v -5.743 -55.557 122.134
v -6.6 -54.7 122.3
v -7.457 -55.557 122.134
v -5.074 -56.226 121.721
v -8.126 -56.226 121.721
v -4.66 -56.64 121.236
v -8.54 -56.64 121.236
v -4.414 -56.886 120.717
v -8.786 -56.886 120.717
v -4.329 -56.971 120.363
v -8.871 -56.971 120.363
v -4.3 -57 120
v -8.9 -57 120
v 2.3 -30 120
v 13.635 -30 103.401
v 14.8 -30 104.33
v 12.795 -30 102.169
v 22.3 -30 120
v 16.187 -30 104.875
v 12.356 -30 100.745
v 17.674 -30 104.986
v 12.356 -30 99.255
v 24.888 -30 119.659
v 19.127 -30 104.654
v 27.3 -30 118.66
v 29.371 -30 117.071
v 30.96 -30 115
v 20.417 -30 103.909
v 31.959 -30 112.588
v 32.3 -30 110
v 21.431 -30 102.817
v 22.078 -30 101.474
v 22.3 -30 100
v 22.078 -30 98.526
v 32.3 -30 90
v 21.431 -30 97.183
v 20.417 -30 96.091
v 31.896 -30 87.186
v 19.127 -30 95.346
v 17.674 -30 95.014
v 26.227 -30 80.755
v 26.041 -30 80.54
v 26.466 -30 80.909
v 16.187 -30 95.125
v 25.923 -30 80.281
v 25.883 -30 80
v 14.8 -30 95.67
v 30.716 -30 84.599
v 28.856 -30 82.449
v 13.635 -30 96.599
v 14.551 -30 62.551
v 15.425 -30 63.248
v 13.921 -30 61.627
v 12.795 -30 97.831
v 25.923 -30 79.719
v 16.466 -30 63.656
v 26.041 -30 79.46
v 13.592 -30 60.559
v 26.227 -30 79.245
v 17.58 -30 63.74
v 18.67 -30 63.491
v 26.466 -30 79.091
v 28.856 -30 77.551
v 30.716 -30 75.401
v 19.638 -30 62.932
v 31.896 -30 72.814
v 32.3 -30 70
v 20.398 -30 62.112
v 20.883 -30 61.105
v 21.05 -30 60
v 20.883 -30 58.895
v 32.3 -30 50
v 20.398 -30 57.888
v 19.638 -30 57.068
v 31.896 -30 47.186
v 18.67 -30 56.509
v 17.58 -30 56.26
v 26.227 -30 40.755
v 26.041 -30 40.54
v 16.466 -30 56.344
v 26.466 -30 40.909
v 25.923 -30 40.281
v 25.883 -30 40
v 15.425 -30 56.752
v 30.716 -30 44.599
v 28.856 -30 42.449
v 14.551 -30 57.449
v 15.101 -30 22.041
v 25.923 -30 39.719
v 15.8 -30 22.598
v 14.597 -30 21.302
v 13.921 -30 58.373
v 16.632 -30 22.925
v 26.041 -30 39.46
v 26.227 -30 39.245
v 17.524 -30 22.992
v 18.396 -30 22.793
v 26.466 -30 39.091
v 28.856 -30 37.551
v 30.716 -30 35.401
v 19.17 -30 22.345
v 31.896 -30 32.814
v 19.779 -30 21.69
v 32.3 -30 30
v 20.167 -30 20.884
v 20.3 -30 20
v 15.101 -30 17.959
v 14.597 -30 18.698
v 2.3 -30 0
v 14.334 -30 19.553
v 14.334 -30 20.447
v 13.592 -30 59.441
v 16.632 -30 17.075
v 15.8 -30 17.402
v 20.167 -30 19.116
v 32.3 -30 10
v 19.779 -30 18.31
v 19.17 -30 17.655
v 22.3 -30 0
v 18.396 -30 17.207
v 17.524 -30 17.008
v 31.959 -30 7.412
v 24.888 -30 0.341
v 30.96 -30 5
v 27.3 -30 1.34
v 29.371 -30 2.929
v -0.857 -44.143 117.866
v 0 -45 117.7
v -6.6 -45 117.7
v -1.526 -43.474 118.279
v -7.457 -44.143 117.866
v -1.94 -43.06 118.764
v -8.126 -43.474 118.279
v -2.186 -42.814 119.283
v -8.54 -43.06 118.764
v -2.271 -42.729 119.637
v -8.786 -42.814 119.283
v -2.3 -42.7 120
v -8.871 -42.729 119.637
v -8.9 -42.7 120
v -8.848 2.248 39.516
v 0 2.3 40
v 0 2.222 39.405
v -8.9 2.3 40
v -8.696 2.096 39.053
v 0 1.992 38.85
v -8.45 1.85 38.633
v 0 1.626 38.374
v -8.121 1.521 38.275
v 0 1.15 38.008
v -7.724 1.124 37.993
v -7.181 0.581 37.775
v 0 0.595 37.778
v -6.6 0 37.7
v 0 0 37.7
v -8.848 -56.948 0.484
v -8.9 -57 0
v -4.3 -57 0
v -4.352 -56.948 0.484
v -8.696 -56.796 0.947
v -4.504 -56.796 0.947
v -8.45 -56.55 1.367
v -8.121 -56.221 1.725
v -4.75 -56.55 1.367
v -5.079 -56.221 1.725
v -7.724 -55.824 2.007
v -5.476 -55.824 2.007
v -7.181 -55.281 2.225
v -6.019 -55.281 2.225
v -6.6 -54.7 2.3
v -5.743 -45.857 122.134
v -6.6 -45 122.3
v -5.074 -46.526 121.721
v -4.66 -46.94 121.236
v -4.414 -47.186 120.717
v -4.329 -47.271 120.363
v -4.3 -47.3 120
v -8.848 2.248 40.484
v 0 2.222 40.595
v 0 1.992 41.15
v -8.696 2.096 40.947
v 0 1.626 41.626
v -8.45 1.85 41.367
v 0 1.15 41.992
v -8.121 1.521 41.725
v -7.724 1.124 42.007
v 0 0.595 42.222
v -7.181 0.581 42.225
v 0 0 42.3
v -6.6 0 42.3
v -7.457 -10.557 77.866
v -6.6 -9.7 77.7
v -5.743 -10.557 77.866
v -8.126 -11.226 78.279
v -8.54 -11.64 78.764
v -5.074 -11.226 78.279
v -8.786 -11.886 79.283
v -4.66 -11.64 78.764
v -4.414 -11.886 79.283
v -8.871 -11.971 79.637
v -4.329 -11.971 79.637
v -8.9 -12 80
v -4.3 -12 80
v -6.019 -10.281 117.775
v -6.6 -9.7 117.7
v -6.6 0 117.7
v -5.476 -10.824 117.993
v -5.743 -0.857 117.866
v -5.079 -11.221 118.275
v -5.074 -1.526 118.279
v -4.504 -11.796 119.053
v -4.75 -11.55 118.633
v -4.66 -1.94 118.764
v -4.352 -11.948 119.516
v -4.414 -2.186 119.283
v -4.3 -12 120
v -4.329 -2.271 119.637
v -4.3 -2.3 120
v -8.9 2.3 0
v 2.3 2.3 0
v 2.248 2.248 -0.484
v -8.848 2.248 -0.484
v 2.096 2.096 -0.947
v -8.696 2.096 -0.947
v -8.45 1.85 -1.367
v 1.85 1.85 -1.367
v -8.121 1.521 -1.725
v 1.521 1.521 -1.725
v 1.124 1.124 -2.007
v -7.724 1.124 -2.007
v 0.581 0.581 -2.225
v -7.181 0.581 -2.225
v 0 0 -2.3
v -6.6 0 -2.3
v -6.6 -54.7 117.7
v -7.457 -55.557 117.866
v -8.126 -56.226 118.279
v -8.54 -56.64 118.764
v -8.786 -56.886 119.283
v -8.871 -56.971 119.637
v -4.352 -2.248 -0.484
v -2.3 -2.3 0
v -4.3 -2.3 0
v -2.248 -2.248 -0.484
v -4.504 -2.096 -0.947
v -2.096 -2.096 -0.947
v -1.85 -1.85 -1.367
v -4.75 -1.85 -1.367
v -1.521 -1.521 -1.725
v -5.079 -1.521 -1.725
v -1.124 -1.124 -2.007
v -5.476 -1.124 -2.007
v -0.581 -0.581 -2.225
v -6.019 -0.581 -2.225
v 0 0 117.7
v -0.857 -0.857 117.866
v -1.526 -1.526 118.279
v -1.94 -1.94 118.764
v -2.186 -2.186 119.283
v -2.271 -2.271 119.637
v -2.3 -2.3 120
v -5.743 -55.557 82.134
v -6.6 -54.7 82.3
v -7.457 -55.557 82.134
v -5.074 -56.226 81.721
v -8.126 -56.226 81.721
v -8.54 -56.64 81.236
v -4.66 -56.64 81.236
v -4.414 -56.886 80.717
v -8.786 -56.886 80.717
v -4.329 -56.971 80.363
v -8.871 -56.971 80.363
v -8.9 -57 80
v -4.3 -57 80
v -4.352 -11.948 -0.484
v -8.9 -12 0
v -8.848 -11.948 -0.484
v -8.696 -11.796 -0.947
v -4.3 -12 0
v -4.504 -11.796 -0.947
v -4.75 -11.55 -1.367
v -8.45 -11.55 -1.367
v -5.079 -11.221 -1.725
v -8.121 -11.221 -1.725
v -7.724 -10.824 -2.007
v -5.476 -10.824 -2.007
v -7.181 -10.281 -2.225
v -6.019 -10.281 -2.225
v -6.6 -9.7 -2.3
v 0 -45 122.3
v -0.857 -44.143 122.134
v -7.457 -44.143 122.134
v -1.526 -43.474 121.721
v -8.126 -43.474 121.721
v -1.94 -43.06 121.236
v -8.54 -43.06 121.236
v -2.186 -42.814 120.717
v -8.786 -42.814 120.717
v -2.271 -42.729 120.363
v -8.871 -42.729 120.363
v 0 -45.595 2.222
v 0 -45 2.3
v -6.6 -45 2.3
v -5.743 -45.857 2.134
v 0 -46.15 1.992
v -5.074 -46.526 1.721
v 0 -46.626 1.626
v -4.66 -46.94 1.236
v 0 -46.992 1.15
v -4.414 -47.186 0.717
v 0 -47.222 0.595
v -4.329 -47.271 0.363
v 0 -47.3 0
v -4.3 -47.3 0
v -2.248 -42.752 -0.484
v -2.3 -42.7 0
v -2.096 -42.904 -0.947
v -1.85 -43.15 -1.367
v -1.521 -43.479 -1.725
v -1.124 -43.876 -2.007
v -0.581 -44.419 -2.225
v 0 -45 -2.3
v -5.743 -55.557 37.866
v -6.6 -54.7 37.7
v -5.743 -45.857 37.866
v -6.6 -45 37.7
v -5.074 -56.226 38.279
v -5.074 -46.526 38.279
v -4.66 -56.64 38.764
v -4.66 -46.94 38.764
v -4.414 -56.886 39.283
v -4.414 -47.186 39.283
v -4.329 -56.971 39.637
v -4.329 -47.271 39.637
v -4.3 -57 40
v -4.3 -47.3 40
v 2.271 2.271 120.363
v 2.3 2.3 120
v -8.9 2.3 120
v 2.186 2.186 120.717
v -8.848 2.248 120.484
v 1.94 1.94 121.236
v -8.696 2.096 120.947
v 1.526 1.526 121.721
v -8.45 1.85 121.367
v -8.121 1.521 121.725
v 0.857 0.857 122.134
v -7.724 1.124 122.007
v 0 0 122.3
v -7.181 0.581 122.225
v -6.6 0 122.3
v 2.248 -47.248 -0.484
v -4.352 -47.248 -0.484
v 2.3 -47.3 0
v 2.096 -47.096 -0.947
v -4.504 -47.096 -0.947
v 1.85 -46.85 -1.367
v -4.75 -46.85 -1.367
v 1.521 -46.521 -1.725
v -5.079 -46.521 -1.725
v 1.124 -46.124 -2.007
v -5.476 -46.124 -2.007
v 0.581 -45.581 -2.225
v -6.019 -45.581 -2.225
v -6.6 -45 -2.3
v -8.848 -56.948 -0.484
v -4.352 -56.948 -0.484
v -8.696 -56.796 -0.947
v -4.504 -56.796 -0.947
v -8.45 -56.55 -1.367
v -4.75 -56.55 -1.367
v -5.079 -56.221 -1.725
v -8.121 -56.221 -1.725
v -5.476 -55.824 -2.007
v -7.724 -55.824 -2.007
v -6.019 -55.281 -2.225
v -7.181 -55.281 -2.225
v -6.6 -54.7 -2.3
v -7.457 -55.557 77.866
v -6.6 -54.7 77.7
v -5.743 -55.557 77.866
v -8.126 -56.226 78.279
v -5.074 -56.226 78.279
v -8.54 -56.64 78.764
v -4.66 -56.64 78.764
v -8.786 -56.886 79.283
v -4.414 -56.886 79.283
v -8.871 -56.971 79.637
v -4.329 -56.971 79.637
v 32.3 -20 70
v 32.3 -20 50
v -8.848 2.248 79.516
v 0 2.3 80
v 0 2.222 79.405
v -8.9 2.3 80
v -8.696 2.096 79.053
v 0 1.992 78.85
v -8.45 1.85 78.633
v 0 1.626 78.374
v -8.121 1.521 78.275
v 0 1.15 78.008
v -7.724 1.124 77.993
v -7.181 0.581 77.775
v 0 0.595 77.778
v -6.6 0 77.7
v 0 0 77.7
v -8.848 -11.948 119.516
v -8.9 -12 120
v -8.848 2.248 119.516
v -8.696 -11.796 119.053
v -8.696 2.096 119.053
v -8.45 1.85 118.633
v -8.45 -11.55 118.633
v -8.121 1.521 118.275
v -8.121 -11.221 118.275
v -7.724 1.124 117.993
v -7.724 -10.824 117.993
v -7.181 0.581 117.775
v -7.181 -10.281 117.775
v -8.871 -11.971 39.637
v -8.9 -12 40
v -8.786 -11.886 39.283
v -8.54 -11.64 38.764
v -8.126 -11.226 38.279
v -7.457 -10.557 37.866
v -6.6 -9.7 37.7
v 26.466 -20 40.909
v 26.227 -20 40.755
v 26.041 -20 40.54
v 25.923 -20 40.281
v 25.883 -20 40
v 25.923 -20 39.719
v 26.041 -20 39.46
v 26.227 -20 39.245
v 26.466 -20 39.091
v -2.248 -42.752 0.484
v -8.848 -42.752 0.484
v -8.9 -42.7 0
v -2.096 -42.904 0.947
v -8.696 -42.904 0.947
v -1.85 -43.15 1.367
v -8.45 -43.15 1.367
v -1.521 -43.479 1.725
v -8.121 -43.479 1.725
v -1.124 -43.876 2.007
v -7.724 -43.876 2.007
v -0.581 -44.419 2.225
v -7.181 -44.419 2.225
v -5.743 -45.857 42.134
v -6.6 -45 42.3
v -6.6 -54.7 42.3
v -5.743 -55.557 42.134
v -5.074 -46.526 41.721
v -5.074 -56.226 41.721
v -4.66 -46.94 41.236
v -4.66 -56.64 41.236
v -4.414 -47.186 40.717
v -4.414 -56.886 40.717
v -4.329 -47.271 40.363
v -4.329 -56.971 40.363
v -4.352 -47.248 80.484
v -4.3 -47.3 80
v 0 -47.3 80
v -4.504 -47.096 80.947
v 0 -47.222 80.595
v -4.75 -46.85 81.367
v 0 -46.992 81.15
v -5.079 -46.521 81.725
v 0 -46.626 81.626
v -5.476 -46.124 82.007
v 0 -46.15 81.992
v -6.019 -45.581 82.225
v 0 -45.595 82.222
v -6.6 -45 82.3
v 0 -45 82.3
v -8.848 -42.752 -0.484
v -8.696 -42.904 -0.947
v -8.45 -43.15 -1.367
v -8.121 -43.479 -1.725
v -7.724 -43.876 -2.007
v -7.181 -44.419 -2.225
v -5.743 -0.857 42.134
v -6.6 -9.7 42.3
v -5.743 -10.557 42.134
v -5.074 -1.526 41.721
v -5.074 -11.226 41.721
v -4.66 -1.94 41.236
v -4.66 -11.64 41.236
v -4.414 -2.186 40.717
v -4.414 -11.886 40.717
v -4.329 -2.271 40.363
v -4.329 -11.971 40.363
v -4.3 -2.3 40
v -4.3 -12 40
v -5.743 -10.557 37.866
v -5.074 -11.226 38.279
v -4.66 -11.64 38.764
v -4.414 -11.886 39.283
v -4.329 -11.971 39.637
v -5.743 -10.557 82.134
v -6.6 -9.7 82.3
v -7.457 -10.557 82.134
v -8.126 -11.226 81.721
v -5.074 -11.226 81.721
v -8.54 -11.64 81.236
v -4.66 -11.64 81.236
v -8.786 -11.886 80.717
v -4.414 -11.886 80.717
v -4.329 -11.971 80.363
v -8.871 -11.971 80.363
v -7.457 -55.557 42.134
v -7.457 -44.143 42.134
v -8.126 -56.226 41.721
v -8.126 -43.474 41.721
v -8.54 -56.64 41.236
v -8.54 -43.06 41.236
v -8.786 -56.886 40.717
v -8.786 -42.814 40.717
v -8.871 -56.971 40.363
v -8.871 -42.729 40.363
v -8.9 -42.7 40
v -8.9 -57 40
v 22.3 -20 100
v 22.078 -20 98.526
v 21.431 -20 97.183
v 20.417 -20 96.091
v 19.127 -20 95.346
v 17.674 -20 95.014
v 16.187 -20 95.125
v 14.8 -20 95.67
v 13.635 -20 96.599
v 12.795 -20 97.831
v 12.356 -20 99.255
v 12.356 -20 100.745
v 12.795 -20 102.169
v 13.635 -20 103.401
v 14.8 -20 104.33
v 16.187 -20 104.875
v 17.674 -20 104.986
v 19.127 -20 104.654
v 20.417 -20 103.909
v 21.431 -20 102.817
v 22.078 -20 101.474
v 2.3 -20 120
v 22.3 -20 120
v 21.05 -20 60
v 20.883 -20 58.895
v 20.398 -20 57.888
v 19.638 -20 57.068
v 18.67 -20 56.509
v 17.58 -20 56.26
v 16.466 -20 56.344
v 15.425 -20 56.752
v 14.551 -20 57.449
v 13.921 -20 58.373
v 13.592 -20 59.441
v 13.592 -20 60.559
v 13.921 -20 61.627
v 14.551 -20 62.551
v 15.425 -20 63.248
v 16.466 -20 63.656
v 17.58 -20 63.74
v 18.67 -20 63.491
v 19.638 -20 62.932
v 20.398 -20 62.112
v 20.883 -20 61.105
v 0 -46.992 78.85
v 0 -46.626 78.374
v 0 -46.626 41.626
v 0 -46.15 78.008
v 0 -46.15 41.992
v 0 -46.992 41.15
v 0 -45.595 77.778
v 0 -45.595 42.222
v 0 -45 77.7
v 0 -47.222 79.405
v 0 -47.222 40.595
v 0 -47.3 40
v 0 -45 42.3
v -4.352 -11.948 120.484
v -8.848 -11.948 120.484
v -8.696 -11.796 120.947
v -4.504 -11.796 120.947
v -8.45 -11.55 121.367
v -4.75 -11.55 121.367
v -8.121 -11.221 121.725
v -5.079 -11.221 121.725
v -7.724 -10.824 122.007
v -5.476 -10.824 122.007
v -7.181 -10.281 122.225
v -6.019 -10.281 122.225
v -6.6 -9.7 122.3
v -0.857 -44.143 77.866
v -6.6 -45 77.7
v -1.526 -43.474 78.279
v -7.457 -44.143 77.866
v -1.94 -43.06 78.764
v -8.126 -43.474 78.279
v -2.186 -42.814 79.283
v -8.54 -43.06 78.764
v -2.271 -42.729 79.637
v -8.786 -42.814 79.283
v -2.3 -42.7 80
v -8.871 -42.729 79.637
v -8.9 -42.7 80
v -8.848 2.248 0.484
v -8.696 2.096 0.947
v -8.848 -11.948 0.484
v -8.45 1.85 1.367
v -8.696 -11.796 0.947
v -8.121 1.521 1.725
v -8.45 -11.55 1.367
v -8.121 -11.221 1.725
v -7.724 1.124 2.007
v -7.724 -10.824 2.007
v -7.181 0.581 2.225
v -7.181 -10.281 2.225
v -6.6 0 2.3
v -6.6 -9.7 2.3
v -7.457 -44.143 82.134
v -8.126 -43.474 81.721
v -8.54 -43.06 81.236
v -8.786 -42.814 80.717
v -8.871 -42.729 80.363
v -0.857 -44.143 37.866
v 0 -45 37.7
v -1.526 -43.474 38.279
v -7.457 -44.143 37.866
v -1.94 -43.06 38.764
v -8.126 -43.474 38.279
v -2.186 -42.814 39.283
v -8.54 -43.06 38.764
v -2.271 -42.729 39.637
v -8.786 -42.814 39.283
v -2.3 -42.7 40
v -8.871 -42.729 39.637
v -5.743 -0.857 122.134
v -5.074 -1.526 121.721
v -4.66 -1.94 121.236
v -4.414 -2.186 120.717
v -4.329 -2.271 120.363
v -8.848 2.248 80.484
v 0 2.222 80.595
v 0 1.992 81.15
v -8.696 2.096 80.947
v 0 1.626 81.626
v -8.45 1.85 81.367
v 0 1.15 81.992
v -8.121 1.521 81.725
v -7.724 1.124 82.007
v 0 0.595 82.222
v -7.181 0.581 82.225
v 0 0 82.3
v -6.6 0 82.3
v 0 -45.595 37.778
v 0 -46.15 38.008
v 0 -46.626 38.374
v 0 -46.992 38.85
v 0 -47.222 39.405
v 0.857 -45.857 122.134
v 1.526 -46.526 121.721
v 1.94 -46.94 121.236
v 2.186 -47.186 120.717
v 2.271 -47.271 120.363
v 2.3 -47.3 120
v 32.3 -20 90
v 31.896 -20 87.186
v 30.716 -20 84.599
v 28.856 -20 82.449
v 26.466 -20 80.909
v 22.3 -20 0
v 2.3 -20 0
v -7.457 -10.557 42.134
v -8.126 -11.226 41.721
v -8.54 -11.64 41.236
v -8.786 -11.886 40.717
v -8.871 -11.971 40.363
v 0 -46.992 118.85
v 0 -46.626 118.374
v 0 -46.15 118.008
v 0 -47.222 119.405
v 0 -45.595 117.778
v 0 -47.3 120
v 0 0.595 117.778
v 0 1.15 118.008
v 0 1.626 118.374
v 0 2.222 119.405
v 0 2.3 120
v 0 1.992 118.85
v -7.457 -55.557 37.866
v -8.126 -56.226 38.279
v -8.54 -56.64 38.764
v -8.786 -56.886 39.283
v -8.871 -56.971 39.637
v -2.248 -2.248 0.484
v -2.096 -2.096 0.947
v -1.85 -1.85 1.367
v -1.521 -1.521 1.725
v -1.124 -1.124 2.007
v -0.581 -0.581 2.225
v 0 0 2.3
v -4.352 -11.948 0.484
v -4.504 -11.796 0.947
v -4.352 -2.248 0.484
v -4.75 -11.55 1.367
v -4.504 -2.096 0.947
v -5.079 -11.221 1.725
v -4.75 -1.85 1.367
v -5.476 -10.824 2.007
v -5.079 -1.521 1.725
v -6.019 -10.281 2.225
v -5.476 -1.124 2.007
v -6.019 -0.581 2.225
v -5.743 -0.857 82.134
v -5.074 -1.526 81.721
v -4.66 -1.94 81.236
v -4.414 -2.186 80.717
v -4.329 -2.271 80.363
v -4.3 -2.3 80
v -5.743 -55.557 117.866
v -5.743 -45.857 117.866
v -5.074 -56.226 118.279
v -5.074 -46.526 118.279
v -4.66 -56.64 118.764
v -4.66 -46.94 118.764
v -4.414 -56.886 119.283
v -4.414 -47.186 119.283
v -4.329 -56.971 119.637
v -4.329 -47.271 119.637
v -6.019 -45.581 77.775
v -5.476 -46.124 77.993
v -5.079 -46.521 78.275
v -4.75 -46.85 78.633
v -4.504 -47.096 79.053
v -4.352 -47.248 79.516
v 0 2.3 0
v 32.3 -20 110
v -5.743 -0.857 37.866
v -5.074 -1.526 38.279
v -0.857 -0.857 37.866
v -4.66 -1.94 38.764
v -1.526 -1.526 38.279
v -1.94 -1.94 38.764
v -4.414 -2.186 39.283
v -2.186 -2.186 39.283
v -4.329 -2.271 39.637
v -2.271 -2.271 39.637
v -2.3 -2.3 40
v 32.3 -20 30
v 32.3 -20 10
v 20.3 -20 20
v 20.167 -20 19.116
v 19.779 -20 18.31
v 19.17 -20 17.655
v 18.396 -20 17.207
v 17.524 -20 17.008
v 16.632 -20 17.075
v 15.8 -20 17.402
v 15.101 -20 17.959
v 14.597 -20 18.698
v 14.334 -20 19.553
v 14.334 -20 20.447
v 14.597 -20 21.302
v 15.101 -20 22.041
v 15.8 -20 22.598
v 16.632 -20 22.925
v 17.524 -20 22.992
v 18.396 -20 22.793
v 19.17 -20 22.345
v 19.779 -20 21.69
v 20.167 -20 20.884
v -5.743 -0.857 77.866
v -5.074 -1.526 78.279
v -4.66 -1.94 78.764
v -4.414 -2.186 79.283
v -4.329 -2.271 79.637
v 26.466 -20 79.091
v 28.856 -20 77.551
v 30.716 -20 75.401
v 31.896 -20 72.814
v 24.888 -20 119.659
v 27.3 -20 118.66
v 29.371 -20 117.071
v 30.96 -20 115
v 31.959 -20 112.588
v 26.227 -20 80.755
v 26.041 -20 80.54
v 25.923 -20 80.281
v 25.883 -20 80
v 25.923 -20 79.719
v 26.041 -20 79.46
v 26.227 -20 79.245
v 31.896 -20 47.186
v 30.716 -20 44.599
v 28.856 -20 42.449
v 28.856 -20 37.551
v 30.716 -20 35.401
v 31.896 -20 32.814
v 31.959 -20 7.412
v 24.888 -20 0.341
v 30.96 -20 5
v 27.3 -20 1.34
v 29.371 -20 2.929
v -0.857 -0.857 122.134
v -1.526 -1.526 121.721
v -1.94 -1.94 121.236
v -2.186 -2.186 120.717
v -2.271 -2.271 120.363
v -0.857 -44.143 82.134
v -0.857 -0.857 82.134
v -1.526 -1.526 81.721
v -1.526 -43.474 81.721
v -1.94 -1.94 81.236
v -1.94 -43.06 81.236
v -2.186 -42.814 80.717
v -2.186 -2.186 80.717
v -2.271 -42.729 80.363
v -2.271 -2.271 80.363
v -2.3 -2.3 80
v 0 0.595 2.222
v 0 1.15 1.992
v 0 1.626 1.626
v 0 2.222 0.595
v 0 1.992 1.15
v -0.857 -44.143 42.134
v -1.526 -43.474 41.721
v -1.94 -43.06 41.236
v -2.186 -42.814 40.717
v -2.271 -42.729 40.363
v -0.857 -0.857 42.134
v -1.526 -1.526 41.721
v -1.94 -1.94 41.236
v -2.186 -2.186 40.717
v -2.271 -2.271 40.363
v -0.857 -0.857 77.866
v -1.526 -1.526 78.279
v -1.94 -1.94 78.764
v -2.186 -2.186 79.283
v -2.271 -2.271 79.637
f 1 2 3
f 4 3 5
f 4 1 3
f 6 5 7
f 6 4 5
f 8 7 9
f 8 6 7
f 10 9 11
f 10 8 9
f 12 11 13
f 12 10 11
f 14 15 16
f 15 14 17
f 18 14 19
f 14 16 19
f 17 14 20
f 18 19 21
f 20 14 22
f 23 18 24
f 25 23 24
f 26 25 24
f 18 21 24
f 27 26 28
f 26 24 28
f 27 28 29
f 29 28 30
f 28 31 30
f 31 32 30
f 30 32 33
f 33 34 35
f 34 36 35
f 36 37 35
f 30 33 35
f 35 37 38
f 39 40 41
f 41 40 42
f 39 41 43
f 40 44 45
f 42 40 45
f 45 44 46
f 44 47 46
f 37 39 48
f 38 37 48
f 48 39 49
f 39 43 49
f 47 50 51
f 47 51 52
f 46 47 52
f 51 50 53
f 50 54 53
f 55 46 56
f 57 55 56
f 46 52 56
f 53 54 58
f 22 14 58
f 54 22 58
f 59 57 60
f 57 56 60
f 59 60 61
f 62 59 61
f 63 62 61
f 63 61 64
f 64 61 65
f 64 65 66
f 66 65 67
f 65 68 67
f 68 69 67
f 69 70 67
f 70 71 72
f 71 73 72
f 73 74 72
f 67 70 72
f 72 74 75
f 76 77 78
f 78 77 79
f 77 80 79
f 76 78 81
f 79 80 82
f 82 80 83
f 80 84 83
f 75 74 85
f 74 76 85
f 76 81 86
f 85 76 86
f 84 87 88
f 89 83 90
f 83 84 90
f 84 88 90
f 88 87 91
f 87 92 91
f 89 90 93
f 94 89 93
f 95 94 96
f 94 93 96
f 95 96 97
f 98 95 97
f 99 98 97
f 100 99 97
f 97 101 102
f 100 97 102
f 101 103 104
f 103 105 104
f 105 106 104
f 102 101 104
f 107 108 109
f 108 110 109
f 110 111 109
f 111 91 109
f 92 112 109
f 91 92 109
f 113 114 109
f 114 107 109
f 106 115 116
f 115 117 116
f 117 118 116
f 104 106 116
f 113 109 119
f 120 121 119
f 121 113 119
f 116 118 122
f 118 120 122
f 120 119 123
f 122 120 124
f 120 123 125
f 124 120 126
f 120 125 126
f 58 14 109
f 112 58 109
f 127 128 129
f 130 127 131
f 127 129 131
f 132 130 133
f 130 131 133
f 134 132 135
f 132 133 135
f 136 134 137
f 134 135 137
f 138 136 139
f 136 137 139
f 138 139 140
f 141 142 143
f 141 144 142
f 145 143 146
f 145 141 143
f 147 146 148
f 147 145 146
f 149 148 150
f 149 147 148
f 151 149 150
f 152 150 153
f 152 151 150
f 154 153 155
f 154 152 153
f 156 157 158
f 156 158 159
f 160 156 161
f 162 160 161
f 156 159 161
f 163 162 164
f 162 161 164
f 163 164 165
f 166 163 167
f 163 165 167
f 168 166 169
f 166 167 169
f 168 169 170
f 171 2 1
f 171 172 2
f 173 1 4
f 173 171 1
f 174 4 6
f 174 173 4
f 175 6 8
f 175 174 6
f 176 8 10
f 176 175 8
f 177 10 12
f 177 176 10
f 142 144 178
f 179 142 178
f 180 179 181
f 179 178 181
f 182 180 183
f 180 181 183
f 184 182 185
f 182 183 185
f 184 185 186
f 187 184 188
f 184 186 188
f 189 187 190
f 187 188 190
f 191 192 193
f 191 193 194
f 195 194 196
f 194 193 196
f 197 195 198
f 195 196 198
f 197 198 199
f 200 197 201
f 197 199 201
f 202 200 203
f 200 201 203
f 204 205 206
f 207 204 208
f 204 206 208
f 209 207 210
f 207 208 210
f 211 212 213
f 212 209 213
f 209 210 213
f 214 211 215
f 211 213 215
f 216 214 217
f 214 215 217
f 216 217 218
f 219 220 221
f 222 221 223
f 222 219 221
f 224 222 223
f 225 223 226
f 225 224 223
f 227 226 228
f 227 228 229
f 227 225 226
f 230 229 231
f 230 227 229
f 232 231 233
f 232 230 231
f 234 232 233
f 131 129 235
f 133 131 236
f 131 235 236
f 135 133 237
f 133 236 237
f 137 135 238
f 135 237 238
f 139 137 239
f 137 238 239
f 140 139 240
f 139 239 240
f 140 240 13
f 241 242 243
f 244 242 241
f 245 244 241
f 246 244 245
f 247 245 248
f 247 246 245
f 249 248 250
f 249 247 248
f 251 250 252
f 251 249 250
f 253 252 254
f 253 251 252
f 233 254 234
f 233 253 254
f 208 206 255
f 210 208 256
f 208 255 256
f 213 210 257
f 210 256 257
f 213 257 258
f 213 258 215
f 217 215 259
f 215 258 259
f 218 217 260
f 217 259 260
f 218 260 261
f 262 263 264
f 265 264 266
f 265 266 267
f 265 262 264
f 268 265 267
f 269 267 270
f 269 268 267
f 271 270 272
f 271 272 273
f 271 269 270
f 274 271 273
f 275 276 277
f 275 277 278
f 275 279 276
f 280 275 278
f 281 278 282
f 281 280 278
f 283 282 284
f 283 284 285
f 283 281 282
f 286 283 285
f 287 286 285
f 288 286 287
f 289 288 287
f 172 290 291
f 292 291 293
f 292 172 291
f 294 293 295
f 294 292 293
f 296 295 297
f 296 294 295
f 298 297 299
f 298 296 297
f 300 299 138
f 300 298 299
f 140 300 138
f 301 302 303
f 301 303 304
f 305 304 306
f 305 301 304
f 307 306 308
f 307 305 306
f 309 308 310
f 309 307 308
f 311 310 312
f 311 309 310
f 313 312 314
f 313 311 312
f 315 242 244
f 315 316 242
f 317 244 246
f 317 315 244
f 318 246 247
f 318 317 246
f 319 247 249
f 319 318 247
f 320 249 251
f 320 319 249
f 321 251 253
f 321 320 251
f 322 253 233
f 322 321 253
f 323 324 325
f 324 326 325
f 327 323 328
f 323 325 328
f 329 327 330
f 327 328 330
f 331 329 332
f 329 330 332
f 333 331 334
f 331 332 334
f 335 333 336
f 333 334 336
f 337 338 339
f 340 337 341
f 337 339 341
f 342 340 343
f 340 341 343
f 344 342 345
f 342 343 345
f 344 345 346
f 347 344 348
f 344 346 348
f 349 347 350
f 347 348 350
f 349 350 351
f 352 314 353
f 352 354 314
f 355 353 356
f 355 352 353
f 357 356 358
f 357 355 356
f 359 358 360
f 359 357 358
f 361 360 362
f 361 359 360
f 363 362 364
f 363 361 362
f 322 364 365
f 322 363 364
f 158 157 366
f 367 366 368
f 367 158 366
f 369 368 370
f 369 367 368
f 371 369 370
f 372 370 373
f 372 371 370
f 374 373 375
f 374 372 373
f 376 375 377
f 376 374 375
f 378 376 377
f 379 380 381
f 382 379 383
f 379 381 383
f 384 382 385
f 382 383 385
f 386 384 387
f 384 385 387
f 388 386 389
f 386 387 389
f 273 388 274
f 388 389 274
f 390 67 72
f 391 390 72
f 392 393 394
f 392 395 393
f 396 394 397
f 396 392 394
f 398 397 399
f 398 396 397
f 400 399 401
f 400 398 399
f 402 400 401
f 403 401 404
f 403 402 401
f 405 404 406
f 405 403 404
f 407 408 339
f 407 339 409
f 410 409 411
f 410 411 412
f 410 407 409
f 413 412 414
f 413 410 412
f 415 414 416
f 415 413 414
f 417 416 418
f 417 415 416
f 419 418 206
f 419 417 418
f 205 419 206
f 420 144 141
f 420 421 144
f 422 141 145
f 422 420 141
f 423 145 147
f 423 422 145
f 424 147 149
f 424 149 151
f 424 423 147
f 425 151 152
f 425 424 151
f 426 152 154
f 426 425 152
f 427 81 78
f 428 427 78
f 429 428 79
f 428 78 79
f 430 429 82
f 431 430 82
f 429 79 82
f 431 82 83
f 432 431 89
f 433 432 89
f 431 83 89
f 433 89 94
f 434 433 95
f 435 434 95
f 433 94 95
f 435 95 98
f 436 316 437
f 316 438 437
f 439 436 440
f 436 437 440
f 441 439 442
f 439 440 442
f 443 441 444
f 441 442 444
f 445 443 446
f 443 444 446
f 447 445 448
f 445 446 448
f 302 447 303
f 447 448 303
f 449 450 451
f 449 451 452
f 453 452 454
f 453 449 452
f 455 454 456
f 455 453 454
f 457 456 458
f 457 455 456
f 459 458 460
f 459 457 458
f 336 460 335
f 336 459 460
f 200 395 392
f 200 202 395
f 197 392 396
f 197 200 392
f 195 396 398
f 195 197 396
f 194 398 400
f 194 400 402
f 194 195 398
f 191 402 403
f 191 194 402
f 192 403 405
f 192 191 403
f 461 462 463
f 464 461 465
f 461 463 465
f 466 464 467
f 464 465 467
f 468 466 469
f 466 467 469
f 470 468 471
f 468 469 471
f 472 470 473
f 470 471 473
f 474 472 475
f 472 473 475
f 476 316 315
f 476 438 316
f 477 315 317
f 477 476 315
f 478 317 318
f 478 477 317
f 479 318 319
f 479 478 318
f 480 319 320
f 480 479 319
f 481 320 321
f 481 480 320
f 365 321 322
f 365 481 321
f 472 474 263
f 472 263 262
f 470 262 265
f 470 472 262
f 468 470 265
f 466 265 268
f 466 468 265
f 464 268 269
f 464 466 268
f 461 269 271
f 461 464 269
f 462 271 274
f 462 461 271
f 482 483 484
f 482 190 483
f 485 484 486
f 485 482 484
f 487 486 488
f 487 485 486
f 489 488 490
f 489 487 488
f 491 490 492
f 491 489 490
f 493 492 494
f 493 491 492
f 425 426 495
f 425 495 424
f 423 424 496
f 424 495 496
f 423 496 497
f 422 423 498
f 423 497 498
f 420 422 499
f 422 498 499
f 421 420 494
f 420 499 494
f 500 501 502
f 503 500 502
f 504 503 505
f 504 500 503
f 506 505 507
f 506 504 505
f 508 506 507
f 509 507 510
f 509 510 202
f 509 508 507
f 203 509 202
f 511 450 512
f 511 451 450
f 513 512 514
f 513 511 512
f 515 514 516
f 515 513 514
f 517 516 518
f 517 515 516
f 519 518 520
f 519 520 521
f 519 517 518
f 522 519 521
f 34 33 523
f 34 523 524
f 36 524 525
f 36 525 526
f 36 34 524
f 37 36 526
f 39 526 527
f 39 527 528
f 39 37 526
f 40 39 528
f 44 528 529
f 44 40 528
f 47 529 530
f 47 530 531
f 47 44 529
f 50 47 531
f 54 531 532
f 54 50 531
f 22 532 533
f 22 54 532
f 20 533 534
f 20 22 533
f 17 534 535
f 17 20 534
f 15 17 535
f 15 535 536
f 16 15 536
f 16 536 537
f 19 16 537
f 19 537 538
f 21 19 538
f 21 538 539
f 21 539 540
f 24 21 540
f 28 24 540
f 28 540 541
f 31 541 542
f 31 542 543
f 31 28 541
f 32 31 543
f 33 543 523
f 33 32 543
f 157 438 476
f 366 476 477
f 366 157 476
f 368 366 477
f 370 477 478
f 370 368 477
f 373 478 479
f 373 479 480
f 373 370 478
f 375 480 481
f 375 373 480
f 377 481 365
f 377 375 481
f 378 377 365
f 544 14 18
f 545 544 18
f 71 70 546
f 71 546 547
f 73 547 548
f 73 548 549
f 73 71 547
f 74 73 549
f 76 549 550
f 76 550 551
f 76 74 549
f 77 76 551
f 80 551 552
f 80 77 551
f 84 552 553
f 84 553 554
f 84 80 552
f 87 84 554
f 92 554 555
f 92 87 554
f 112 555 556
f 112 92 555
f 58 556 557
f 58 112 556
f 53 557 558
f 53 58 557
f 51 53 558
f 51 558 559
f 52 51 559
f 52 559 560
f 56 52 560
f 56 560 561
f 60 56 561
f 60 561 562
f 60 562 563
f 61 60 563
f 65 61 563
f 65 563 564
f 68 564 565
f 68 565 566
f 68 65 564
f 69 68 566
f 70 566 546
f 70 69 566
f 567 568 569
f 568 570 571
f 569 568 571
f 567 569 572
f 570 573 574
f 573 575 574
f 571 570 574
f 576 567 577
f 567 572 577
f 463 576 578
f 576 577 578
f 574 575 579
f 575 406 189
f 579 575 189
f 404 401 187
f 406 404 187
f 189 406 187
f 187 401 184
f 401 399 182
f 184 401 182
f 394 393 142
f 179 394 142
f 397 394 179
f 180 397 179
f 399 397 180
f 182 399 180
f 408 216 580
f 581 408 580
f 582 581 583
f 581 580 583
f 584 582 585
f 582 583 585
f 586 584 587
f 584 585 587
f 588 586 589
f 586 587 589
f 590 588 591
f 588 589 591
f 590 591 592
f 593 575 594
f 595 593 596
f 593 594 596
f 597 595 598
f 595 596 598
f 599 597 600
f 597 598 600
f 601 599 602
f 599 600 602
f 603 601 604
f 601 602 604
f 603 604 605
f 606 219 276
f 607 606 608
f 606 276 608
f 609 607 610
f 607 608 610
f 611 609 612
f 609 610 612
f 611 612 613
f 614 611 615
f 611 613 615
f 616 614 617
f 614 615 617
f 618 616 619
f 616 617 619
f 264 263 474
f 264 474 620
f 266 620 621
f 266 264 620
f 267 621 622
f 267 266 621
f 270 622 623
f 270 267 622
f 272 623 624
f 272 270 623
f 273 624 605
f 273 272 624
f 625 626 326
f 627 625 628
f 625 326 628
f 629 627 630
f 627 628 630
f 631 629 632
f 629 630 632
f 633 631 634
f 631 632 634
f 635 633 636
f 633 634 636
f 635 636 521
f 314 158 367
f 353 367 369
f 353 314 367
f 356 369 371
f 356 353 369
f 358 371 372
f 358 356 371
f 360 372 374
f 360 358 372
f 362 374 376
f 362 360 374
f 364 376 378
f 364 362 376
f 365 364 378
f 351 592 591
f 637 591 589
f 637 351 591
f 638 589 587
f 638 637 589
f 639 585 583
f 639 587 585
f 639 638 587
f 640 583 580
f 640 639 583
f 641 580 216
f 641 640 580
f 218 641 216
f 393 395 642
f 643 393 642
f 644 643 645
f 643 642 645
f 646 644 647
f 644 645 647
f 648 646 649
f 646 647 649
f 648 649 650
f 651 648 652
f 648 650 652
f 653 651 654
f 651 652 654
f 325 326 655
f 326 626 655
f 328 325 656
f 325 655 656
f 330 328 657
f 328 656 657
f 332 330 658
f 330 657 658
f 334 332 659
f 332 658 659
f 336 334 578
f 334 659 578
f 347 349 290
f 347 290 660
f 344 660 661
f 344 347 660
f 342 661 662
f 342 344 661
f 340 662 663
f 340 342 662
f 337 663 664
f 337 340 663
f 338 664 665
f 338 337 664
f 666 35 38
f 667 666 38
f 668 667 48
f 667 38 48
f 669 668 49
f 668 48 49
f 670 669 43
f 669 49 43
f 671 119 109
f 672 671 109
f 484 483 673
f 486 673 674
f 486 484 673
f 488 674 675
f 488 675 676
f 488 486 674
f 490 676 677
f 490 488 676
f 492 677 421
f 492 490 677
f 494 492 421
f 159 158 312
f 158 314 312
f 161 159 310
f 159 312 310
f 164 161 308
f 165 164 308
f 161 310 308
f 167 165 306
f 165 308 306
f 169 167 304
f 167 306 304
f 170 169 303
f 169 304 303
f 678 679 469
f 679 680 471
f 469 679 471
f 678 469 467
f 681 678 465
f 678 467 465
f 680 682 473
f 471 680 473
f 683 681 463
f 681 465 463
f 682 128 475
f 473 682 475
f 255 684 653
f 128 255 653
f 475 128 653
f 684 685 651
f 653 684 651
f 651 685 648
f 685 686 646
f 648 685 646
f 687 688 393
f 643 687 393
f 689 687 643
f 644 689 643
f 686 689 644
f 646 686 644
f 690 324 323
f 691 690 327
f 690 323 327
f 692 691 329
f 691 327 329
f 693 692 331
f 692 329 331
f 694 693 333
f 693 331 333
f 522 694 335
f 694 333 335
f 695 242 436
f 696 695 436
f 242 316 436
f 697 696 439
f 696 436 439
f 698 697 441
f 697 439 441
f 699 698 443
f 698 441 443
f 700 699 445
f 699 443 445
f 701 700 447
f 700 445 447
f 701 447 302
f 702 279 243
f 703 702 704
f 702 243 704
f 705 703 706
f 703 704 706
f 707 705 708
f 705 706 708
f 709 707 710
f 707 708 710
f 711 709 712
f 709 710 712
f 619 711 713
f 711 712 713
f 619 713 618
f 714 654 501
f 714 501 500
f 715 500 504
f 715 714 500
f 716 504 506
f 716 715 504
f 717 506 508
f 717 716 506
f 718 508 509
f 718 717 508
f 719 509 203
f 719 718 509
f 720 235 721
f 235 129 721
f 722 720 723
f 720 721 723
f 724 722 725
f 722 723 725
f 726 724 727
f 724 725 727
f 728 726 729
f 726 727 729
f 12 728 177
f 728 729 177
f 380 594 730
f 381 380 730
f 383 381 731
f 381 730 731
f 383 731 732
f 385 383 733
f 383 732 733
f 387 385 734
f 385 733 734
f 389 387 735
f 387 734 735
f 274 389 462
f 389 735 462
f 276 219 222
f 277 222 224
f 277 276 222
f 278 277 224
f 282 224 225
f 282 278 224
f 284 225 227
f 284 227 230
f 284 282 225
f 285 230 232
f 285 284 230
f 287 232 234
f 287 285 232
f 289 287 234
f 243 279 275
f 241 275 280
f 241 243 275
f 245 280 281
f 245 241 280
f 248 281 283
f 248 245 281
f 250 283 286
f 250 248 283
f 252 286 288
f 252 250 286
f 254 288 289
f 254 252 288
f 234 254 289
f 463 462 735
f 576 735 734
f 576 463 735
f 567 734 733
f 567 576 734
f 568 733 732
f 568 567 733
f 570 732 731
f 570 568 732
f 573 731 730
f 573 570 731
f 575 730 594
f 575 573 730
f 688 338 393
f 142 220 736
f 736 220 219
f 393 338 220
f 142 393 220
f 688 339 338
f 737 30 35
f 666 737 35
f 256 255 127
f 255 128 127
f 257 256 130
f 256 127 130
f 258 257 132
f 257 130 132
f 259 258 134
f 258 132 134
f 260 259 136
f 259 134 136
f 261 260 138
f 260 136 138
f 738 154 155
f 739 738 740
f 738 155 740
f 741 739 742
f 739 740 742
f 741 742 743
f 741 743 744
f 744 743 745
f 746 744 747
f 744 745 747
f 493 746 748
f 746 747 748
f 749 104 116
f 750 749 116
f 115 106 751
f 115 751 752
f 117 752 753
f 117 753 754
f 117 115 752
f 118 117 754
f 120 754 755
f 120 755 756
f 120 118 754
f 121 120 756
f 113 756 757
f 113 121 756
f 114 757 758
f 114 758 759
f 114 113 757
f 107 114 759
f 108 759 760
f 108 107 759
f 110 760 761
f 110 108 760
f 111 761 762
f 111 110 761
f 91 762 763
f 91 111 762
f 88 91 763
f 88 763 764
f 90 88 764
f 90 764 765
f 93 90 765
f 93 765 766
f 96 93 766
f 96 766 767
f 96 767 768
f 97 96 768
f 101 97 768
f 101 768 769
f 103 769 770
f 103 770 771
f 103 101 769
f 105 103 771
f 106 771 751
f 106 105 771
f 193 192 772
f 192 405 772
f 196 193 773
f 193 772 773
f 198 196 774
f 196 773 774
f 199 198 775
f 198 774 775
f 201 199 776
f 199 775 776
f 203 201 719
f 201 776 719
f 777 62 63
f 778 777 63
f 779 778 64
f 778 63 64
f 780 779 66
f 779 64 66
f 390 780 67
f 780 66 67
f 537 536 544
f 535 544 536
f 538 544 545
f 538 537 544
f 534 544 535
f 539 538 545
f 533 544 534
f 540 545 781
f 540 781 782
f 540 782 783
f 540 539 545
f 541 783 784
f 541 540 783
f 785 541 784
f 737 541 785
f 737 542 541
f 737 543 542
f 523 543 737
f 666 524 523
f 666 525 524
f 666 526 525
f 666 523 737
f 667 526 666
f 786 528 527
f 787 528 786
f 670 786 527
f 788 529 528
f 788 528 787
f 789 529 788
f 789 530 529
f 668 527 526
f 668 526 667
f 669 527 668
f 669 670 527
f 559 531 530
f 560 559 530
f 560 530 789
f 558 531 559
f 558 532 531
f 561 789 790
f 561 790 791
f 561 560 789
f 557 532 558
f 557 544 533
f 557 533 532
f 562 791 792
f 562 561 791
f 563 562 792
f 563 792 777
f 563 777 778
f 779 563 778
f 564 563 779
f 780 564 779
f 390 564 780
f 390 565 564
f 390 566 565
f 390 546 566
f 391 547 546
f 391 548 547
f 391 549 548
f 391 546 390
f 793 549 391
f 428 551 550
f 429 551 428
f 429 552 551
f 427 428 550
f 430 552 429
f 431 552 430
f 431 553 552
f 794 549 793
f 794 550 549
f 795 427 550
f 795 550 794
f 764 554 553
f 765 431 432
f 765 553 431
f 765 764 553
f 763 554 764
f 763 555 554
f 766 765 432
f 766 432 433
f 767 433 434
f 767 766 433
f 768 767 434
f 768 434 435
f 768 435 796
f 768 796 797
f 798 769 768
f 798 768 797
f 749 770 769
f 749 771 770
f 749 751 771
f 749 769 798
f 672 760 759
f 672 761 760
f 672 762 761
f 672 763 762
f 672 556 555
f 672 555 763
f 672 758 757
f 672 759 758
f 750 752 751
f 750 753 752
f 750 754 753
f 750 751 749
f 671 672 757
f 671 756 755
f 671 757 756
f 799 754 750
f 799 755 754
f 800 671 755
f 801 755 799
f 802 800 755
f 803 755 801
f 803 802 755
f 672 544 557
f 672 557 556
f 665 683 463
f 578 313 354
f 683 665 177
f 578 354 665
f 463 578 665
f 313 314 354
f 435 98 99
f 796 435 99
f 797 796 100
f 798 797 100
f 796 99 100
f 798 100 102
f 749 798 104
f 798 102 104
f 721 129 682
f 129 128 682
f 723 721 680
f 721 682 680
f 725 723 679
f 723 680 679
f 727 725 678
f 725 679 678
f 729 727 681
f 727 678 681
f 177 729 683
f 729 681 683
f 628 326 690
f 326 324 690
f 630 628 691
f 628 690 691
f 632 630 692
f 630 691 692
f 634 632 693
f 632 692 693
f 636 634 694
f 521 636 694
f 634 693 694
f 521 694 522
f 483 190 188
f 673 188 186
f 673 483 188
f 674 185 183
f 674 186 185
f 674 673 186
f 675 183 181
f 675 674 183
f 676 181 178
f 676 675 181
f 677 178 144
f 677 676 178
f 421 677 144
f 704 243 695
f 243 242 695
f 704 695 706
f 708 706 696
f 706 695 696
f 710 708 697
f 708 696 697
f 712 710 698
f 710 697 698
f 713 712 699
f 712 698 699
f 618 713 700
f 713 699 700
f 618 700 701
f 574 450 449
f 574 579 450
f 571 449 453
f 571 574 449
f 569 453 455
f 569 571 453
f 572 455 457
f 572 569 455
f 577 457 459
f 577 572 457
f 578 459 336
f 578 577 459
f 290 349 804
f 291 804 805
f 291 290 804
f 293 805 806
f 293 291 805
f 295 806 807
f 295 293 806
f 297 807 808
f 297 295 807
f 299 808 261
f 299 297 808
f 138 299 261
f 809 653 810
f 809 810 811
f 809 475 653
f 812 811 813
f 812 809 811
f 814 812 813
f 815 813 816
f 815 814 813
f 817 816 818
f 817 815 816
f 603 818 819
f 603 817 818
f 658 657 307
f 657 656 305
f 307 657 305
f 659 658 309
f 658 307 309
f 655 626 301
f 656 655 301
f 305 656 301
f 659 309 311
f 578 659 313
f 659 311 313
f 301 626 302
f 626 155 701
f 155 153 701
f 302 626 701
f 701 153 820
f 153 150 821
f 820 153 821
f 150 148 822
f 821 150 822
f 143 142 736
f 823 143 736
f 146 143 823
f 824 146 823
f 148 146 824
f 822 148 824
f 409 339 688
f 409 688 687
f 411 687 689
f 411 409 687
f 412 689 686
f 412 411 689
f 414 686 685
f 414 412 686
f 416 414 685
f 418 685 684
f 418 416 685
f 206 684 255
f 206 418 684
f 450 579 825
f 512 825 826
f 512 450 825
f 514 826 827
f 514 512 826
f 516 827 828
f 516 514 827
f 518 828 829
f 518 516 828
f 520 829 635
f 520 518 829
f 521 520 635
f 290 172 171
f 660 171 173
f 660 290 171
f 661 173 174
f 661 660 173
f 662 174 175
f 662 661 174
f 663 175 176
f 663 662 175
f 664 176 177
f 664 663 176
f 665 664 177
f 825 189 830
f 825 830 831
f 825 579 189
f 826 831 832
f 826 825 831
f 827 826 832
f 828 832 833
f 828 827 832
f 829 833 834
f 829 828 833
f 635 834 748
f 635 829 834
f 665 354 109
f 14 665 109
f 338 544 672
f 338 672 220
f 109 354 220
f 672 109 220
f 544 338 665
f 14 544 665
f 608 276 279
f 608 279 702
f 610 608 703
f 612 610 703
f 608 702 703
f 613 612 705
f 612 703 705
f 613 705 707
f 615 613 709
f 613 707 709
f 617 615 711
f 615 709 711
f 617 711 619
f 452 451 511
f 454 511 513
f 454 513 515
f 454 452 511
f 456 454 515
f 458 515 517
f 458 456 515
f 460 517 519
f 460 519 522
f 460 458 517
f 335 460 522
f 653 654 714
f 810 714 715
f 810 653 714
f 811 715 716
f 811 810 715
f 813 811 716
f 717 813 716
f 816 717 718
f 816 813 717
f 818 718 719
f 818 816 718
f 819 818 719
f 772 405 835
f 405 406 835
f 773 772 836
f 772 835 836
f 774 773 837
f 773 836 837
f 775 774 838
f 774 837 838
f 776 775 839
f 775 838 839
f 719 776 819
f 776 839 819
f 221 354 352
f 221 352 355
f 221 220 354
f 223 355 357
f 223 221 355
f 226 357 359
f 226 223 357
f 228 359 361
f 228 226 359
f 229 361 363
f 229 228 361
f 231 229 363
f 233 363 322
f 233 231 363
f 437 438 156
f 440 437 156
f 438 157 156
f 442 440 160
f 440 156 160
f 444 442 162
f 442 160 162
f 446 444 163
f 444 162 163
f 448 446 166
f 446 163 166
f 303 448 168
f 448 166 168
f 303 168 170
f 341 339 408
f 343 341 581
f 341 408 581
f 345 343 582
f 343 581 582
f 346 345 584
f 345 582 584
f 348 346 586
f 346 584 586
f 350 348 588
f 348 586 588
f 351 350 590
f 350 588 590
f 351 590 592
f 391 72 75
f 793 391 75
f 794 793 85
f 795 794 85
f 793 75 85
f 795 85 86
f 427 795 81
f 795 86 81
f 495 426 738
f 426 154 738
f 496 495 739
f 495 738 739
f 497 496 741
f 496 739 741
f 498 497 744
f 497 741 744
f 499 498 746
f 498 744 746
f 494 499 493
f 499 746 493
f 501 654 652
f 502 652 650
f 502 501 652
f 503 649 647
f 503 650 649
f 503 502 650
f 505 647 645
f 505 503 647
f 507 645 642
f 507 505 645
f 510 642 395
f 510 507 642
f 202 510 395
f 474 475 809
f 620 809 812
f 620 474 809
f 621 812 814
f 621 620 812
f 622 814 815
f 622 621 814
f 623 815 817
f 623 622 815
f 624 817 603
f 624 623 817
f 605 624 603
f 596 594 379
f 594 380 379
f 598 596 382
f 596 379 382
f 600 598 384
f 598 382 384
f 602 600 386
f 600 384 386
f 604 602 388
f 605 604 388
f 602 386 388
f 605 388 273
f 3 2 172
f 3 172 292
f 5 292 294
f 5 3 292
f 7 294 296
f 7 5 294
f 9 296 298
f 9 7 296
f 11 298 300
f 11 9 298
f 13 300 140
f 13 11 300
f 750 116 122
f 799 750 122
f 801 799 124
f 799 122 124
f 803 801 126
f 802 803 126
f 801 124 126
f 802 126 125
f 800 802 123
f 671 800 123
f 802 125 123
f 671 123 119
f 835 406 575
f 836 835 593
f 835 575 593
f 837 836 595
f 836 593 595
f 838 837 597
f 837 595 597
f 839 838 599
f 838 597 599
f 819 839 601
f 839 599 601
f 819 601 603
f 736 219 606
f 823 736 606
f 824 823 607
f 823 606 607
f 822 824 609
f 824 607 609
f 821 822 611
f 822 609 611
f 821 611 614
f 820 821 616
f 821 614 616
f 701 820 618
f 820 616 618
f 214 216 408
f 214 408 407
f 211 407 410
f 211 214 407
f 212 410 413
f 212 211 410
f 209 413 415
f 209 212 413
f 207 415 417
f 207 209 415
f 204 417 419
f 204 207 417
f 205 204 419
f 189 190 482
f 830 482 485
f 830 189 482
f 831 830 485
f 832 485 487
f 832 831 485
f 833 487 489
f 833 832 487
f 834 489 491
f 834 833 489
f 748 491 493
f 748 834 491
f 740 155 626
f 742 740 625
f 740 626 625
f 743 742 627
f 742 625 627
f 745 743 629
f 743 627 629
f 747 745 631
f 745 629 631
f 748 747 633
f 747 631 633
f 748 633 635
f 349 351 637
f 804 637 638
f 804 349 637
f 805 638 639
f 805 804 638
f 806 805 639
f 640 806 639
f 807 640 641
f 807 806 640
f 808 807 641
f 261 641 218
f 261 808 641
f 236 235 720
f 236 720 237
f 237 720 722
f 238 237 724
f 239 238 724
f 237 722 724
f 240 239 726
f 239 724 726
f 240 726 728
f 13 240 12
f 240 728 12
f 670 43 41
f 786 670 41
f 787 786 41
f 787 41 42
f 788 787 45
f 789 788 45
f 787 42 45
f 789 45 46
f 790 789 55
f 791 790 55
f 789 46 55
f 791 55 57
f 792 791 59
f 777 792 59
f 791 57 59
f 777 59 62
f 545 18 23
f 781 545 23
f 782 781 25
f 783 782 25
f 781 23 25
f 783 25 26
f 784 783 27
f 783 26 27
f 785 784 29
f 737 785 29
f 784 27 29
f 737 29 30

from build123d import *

# Parameters (mm, degrees)
EXTRU_MINCE1_DEPTH           = 2.3
CONG_1_R                     = 2.3
ESQUISSE2_W                  = 120
ESQUISSE2_H                  = 49.6
BOSS_EXTRU_1_DEPTH           = 2.3
R_P_TITION_START             = 117.7
R_P_TITION_LIN_AIRE1_DEPTH   = 4.6
R_P_TITION_START_2           = 37.7
R_P_TITION_LIN_AIRE1_2_DEPTH = 4.6
R_P_TITION_START_3           = 77.7
R_P_TITION_LIN_AIRE1_3_DEPTH = 4.6
CONG_2_R                     = 2.3
BOSS_EXTRU_2_START           = -30
BOSS_EXTRU_2_OUTLINE_R       = 5
BOSS_EXTRU_2_OUTLINE_R_2     = 3.75
BOSS_EXTRU_2_OUTLINE_R_3     = 3
BOSS_EXTRU_2_DEPTH           = 10


# Read off the part's stored shape, not the designer's step: Répétition linéaire1, Boss.-Extru.2
with BuildPart() as part:
    # Esquisse1 → Extru.-Mince1 (new, symmetric)
    with BuildSketch(Plane.XY):
        Polygon((-4.3, -57), (-4.3, -47.3), (2.3, -47.3), (2.3, 2.3), (-8.9, 2.3), (-8.9, -12), (-4.3, -12), (-4.3, -2.3), (-2.3, -2.3), (-2.3, -42.7), (-8.9, -42.7), (-8.9, -57), align=None)
    extrude(amount=EXTRU_MINCE1_DEPTH, both=True)

    # Congé1
    cong_1_edges = [part.edges().sort_by_distance(p)[0] for p in [
        (-6.6, -57, -2.3),
        (-4.3, -52.15, -2.3),
        (-1, -47.3, -2.3),
        (2.3, -22.5, -2.3),
        (-3.3, 2.3, -2.3),
        (-8.9, -4.85, -2.3),
        (-6.6, -12, -2.3),
        (-4.3, -7.15, -2.3),
        (-3.3, -2.3, -2.3),
        (-2.3, -22.5, -2.3),
        (-5.6, -42.7, -2.3),
        (-8.9, -49.85, -2.3),
        (-5.6, -42.7, 2.3),
        (-2.3, -22.5, 2.3),
        (-3.3, -2.3, 2.3),
        (-4.3, -7.15, 2.3),
        (-6.6, -12, 2.3),
        (-8.9, -4.85, 2.3),
        (-3.3, 2.3, 2.3),
        (2.3, -22.5, 2.3),
        (-1, -47.3, 2.3),
        (-4.3, -52.15, 2.3),
        (-6.6, -57, 2.3),
        (-8.9, -49.85, 2.3),
    ]]
    fillet(cong_1_edges, radius=CONG_1_R - 0.0001)  # a hair under: the kernel refuses the full size

    # Esquisse2 → Boss.-Extru.1 (add)
    with BuildSketch(Plane(origin=(0, 0, 0), x_dir=(0, 0, -1), z_dir=(1, 0, 0))):
        with Locations((-60, -22.5)):
            Rectangle(ESQUISSE2_W, ESQUISSE2_H)
    extrude(amount=BOSS_EXTRU_1_DEPTH)

    # Répétition linéaire1 outline → Répétition linéaire1 (add)
    with BuildSketch(Plane.XY.offset(R_P_TITION_START)):
        Polygon((-8.9, 2.3), (-8.9, -12), (-4.3, -12), (-4.3, -2.3), (-2.3, -2.3), (-2.3, -42.7), (-8.9, -42.7), (-8.9, -57), (-4.3, -57), (-4.3, -47.3), (2.3, -47.3), (2.3, 2.3), align=None)
    extrude(amount=R_P_TITION_LIN_AIRE1_DEPTH)

    # R_p_tition lin_aire1 2 outline → R_p_tition lin_aire1 2 (add)
    with BuildSketch(Plane.XY.offset(R_P_TITION_START_2)):
        Polygon((0, 2.3), (-8.9, 2.3), (-8.9, -12), (-4.3, -12), (-4.3, -2.3), (-2.3, -2.3), (-2.3, -42.7), (-8.9, -42.7), (-8.9, -57), (-4.3, -57), (-4.3, -47.3), (0, -47.3), align=None)
    extrude(amount=R_P_TITION_LIN_AIRE1_2_DEPTH)

    # R_p_tition lin_aire1 3 outline → R_p_tition lin_aire1 3 (add)
    with BuildSketch(Plane.XY.offset(R_P_TITION_START_3)):
        Polygon((0, 2.3), (-8.9, 2.3), (-8.9, -12), (-4.3, -12), (-4.3, -2.3), (-2.3, -2.3), (-2.3, -42.7), (-8.9, -42.7), (-8.9, -57), (-4.3, -57), (-4.3, -47.3), (0, -47.3), align=None)
    extrude(amount=R_P_TITION_LIN_AIRE1_3_DEPTH)

    # Congé2
    cong_2_edges = [part.edges().sort_by_distance(p)[0] for p in [
        (-2.15, -47.3, 82.3),
        (-4.45, 2.3, 82.3),
        (-4.3, -7.15, 82.3),
        (-3.3, -2.3, 82.3),
        (-2.3, -22.5, 82.3),
        (-5.6, -42.7, 82.3),
        (-8.9, -49.85, 82.3),
        (-4.45, 2.3, 77.7),
        (-2.15, -47.3, 77.7),
        (-4.3, -52.15, 77.7),
        (-6.6, -57, 77.7),
        (-6.6, -12, 77.7),
        (-8.9, -4.85, 77.7),
        (-8.9, -49.85, 77.7),
        (-6.6, -57, 82.3),
        (-4.3, -52.15, 82.3),
        (-8.9, -4.85, 82.3),
        (-6.6, -12, 82.3),
        (-4.3, -7.15, 77.7),
        (-3.3, -2.3, 77.7),
        (-2.3, -22.5, 77.7),
        (-5.6, -42.7, 77.7),
        (2.3, -22.5, 122.3),
        (-1, -47.3, 122.3),
        (-3.3, 2.3, 122.3),
        (-4.45, 2.3, 117.7),
        (-2.15, -47.3, 117.7),
        (-4.3, -52.15, 117.7),
        (-6.6, -57, 117.7),
        (-6.6, -12, 117.7),
        (-8.9, -4.85, 117.7),
        (-8.9, -49.85, 117.7),
        (-6.6, -57, 122.3),
        (-4.3, -52.15, 122.3),
        (-8.9, -4.85, 122.3),
        (-6.6, -12, 122.3),
        (-4.3, -7.15, 117.7),
        (-3.3, -2.3, 117.7),
        (-2.3, -22.5, 117.7),
        (-5.6, -42.7, 117.7),
        (-8.9, -49.85, 122.3),
        (-4.3, -7.15, 122.3),
        (-3.3, -2.3, 122.3),
        (-2.3, -22.5, 122.3),
        (-5.6, -42.7, 122.3),
        (-2.15, -47.3, 42.3),
        (-4.45, 2.3, 42.3),
        (-4.3, -7.15, 42.3),
        (-3.3, -2.3, 42.3),
        (-2.3, -22.5, 42.3),
        (-5.6, -42.7, 42.3),
        (-8.9, -49.85, 42.3),
        (-4.45, 2.3, 37.7),
        (-2.15, -47.3, 37.7),
        (-4.3, -52.15, 37.7),
        (-6.6, -57, 37.7),
        (-6.6, -12, 37.7),
        (-8.9, -4.85, 37.7),
        (-8.9, -49.85, 37.7),
        (-6.6, -57, 42.3),
        (-4.3, -52.15, 42.3),
        (-8.9, -4.85, 42.3),
        (-6.6, -12, 42.3),
        (-4.3, -7.15, 37.7),
        (-3.3, -2.3, 37.7),
        (-2.3, -22.5, 37.7),
        (-5.6, -42.7, 37.7),
    ]]
    fillet(cong_2_edges, radius=CONG_2_R - 0.0001)  # a hair under: the kernel refuses the full size

    # Boss.-Extru.2 outline → Boss.-Extru.2 (add)
    with BuildSketch(Plane(origin=(0, 0, 0), x_dir=(1, 0, 0), z_dir=(0, 1, 0)).offset(BOSS_EXTRU_2_START)):
        with BuildLine():
            Line((2.3, -120), (22.3, -120))
            ThreePointArc((22.3, -120), (29.371067812, -117.071067812), (32.3, -110))
            Line((32.3, -110), (32.3, -90))
            ThreePointArc((32.3, -90), (30.71604952, -84.599063926), (26.465977905, -80.909090909))
            ThreePointArc((26.465977905, -80.909090909), (25.882575695, -80), (26.465977905, -79.090909091))
            ThreePointArc((26.465977905, -79.090909091), (30.71604952, -75.400936074), (32.3, -70))
            Line((32.3, -70), (32.3, -50))
            ThreePointArc((32.3, -50), (30.71604952, -44.599063926), (26.465977905, -40.909090909))
            ThreePointArc((26.465977905, -40.909090909), (25.882575695, -40), (26.465977905, -39.090909091))
            ThreePointArc((26.465977905, -39.090909091), (30.71604952, -35.400936074), (32.3, -30))
            Line((32.3, -30), (32.3, -10))
            ThreePointArc((32.3, -10), (29.371067812, -2.928932188), (22.3, 0))
            Line((22.3, 0), (2.3, 0))
            Line((2.3, 0), (2.3, -120))
        make_face()
        with Locations((17.3, -100)):
            Circle(BOSS_EXTRU_2_OUTLINE_R, mode=Mode.SUBTRACT)
        with Locations((17.3, -60)):
            Circle(BOSS_EXTRU_2_OUTLINE_R_2, mode=Mode.SUBTRACT)
        with Locations((17.3, -20)):
            Circle(BOSS_EXTRU_2_OUTLINE_R_3, mode=Mode.SUBTRACT)
    extrude(amount=BOSS_EXTRU_2_DEPTH)


solid = part.part
